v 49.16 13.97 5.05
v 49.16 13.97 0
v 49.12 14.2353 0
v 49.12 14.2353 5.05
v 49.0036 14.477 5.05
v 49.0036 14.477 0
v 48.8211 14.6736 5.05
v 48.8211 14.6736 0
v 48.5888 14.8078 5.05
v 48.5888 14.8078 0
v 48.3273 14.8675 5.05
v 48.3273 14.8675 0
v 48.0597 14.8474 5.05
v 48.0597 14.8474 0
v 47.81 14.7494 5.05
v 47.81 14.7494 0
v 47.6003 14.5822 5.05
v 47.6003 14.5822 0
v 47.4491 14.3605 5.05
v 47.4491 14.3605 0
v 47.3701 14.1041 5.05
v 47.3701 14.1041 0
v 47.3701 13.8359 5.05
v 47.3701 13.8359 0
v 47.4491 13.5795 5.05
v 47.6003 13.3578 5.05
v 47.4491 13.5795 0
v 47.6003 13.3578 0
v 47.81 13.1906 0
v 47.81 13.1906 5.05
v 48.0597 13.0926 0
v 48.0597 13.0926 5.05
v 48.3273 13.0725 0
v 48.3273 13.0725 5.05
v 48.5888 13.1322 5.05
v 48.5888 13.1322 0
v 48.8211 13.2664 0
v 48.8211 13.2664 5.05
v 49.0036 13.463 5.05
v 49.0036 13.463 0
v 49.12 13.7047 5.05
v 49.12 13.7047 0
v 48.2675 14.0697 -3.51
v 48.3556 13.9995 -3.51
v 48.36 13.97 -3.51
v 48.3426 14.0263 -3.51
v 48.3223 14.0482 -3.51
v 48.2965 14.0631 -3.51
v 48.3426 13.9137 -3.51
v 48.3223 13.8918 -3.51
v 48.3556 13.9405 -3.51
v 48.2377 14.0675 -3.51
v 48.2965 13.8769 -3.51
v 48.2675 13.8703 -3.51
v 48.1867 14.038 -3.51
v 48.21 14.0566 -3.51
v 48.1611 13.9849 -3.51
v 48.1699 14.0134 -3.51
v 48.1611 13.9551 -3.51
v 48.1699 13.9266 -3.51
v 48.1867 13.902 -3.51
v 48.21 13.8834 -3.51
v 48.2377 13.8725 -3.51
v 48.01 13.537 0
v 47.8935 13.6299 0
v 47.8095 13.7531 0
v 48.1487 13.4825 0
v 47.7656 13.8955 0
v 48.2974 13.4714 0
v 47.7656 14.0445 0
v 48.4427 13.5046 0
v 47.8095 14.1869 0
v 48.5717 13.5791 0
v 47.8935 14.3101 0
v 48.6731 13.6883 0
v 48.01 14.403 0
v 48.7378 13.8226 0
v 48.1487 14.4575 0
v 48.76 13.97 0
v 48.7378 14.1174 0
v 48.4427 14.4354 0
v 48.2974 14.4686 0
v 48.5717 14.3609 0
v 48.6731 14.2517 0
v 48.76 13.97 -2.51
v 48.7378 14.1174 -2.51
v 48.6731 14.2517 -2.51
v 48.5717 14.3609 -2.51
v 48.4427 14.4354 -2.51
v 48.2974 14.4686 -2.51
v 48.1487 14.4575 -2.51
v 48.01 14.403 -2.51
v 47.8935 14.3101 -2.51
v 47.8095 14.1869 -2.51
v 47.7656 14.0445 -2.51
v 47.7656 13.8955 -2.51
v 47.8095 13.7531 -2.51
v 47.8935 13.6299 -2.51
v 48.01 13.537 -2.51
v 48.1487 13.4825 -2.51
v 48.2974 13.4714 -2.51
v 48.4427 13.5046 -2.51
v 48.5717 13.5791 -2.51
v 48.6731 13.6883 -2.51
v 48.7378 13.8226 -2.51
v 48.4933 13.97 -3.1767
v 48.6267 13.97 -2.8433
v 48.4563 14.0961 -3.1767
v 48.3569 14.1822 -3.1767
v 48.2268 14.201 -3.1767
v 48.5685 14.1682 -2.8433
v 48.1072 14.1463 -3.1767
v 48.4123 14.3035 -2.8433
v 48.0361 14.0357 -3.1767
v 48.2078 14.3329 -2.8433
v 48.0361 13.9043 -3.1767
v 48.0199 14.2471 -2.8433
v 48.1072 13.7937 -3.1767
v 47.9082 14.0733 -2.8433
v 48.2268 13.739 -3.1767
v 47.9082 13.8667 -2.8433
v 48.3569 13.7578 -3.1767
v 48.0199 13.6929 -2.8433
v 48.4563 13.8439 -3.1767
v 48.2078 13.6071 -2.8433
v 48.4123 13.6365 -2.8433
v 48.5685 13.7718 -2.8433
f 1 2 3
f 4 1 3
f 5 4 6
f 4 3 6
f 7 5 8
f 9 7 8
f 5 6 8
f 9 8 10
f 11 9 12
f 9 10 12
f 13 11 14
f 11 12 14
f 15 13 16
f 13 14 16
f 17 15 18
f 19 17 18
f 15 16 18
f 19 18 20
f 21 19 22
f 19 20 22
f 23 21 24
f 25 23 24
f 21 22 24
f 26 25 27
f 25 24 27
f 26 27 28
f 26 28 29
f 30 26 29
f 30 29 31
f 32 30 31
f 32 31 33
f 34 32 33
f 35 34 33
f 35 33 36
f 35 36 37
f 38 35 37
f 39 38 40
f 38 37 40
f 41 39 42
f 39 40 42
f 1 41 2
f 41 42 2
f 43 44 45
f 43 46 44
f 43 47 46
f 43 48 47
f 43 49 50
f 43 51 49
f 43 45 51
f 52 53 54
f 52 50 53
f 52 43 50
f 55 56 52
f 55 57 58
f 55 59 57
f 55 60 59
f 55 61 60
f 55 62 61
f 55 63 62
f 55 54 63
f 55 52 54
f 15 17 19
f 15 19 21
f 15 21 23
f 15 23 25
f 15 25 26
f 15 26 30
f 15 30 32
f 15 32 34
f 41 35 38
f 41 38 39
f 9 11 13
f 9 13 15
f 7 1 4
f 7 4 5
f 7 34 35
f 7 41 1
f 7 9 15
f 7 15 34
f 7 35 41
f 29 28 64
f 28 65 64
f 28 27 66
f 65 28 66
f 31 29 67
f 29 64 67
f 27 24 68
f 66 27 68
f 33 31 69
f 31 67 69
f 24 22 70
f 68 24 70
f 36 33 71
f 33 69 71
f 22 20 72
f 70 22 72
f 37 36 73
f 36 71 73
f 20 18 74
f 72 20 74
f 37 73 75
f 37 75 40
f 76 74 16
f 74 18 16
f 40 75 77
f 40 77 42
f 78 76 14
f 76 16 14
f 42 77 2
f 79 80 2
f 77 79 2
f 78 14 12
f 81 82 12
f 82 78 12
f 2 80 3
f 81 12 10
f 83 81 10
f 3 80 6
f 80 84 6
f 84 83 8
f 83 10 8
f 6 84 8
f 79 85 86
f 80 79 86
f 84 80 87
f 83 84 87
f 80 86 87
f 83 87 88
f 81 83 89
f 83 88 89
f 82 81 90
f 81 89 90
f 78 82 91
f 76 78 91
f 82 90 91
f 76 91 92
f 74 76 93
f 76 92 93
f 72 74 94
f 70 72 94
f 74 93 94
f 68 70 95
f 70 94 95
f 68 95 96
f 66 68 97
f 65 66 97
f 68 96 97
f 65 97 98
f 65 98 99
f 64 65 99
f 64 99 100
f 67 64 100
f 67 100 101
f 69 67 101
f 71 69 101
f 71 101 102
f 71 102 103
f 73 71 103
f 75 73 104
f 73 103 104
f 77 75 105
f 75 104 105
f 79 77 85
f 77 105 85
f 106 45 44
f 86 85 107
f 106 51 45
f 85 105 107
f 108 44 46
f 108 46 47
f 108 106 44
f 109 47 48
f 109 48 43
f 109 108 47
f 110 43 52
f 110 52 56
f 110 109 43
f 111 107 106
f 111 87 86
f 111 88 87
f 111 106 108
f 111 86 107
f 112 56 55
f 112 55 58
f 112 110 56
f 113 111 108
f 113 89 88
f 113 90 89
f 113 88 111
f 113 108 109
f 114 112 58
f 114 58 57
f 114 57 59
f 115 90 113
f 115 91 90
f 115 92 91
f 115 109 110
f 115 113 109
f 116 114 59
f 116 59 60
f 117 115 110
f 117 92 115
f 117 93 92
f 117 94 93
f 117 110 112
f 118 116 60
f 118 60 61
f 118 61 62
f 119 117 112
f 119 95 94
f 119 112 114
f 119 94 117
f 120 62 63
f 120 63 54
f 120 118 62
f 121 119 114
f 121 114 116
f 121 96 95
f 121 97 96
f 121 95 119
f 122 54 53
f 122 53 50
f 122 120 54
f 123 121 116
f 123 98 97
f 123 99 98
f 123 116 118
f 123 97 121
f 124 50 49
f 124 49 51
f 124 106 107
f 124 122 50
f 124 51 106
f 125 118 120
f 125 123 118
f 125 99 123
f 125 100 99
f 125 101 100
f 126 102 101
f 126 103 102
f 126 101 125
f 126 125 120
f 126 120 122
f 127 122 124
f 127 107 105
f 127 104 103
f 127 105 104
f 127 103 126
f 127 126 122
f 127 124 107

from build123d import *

# Parameters (mm, degrees)
CYLINDER007_R     = 0.5
CYLINDER007_DEPTH = 2.51
CYLINDER008_R     = 0.9
CYLINDER008_DEPTH = 5.05


with BuildPart() as cylinder007:
    # Cylinder007 → Cylinder007 (new body)
    with BuildSketch(Plane(origin=(2.54, 0, -2.51), x_dir=(1, 0, 0), z_dir=(0, 0, 1))):
        Circle(CYLINDER007_R)
    extrude(amount=CYLINDER007_DEPTH)


with BuildPart() as cone003:
    # Cone003 → Cone003 (revolve)
    with BuildSketch(Plane(origin=(2.54, 0, -3.51), x_dir=(1, 0, 0), z_dir=(0, -1, 0))):
        Polygon((0, 0), (0.1, 0), (0.5, 1), (0, 1), align=None)
    revolve(axis=Axis((2.54, 0, -3.51), (0, 0, 1)))


with BuildPart() as fusion003:
    # Cylinder008 → Cylinder008 (new body)
    with BuildSketch(Plane(origin=(2.54, 0, 0), x_dir=(1, 0, 0), z_dir=(0, 0, 1))):
        Circle(CYLINDER008_R)
    extrude(amount=CYLINDER008_DEPTH)

    # Fusion003: union Cylinder007, Cone003
    add(cylinder007.part)
    add(cone003.part)


with BuildPart() as fusion003_1:
    # Fusion003 placement: moved
    add(fusion003.part.moved(Location((45.72, 13.97, 0))))


solid = fusion003_1.part
